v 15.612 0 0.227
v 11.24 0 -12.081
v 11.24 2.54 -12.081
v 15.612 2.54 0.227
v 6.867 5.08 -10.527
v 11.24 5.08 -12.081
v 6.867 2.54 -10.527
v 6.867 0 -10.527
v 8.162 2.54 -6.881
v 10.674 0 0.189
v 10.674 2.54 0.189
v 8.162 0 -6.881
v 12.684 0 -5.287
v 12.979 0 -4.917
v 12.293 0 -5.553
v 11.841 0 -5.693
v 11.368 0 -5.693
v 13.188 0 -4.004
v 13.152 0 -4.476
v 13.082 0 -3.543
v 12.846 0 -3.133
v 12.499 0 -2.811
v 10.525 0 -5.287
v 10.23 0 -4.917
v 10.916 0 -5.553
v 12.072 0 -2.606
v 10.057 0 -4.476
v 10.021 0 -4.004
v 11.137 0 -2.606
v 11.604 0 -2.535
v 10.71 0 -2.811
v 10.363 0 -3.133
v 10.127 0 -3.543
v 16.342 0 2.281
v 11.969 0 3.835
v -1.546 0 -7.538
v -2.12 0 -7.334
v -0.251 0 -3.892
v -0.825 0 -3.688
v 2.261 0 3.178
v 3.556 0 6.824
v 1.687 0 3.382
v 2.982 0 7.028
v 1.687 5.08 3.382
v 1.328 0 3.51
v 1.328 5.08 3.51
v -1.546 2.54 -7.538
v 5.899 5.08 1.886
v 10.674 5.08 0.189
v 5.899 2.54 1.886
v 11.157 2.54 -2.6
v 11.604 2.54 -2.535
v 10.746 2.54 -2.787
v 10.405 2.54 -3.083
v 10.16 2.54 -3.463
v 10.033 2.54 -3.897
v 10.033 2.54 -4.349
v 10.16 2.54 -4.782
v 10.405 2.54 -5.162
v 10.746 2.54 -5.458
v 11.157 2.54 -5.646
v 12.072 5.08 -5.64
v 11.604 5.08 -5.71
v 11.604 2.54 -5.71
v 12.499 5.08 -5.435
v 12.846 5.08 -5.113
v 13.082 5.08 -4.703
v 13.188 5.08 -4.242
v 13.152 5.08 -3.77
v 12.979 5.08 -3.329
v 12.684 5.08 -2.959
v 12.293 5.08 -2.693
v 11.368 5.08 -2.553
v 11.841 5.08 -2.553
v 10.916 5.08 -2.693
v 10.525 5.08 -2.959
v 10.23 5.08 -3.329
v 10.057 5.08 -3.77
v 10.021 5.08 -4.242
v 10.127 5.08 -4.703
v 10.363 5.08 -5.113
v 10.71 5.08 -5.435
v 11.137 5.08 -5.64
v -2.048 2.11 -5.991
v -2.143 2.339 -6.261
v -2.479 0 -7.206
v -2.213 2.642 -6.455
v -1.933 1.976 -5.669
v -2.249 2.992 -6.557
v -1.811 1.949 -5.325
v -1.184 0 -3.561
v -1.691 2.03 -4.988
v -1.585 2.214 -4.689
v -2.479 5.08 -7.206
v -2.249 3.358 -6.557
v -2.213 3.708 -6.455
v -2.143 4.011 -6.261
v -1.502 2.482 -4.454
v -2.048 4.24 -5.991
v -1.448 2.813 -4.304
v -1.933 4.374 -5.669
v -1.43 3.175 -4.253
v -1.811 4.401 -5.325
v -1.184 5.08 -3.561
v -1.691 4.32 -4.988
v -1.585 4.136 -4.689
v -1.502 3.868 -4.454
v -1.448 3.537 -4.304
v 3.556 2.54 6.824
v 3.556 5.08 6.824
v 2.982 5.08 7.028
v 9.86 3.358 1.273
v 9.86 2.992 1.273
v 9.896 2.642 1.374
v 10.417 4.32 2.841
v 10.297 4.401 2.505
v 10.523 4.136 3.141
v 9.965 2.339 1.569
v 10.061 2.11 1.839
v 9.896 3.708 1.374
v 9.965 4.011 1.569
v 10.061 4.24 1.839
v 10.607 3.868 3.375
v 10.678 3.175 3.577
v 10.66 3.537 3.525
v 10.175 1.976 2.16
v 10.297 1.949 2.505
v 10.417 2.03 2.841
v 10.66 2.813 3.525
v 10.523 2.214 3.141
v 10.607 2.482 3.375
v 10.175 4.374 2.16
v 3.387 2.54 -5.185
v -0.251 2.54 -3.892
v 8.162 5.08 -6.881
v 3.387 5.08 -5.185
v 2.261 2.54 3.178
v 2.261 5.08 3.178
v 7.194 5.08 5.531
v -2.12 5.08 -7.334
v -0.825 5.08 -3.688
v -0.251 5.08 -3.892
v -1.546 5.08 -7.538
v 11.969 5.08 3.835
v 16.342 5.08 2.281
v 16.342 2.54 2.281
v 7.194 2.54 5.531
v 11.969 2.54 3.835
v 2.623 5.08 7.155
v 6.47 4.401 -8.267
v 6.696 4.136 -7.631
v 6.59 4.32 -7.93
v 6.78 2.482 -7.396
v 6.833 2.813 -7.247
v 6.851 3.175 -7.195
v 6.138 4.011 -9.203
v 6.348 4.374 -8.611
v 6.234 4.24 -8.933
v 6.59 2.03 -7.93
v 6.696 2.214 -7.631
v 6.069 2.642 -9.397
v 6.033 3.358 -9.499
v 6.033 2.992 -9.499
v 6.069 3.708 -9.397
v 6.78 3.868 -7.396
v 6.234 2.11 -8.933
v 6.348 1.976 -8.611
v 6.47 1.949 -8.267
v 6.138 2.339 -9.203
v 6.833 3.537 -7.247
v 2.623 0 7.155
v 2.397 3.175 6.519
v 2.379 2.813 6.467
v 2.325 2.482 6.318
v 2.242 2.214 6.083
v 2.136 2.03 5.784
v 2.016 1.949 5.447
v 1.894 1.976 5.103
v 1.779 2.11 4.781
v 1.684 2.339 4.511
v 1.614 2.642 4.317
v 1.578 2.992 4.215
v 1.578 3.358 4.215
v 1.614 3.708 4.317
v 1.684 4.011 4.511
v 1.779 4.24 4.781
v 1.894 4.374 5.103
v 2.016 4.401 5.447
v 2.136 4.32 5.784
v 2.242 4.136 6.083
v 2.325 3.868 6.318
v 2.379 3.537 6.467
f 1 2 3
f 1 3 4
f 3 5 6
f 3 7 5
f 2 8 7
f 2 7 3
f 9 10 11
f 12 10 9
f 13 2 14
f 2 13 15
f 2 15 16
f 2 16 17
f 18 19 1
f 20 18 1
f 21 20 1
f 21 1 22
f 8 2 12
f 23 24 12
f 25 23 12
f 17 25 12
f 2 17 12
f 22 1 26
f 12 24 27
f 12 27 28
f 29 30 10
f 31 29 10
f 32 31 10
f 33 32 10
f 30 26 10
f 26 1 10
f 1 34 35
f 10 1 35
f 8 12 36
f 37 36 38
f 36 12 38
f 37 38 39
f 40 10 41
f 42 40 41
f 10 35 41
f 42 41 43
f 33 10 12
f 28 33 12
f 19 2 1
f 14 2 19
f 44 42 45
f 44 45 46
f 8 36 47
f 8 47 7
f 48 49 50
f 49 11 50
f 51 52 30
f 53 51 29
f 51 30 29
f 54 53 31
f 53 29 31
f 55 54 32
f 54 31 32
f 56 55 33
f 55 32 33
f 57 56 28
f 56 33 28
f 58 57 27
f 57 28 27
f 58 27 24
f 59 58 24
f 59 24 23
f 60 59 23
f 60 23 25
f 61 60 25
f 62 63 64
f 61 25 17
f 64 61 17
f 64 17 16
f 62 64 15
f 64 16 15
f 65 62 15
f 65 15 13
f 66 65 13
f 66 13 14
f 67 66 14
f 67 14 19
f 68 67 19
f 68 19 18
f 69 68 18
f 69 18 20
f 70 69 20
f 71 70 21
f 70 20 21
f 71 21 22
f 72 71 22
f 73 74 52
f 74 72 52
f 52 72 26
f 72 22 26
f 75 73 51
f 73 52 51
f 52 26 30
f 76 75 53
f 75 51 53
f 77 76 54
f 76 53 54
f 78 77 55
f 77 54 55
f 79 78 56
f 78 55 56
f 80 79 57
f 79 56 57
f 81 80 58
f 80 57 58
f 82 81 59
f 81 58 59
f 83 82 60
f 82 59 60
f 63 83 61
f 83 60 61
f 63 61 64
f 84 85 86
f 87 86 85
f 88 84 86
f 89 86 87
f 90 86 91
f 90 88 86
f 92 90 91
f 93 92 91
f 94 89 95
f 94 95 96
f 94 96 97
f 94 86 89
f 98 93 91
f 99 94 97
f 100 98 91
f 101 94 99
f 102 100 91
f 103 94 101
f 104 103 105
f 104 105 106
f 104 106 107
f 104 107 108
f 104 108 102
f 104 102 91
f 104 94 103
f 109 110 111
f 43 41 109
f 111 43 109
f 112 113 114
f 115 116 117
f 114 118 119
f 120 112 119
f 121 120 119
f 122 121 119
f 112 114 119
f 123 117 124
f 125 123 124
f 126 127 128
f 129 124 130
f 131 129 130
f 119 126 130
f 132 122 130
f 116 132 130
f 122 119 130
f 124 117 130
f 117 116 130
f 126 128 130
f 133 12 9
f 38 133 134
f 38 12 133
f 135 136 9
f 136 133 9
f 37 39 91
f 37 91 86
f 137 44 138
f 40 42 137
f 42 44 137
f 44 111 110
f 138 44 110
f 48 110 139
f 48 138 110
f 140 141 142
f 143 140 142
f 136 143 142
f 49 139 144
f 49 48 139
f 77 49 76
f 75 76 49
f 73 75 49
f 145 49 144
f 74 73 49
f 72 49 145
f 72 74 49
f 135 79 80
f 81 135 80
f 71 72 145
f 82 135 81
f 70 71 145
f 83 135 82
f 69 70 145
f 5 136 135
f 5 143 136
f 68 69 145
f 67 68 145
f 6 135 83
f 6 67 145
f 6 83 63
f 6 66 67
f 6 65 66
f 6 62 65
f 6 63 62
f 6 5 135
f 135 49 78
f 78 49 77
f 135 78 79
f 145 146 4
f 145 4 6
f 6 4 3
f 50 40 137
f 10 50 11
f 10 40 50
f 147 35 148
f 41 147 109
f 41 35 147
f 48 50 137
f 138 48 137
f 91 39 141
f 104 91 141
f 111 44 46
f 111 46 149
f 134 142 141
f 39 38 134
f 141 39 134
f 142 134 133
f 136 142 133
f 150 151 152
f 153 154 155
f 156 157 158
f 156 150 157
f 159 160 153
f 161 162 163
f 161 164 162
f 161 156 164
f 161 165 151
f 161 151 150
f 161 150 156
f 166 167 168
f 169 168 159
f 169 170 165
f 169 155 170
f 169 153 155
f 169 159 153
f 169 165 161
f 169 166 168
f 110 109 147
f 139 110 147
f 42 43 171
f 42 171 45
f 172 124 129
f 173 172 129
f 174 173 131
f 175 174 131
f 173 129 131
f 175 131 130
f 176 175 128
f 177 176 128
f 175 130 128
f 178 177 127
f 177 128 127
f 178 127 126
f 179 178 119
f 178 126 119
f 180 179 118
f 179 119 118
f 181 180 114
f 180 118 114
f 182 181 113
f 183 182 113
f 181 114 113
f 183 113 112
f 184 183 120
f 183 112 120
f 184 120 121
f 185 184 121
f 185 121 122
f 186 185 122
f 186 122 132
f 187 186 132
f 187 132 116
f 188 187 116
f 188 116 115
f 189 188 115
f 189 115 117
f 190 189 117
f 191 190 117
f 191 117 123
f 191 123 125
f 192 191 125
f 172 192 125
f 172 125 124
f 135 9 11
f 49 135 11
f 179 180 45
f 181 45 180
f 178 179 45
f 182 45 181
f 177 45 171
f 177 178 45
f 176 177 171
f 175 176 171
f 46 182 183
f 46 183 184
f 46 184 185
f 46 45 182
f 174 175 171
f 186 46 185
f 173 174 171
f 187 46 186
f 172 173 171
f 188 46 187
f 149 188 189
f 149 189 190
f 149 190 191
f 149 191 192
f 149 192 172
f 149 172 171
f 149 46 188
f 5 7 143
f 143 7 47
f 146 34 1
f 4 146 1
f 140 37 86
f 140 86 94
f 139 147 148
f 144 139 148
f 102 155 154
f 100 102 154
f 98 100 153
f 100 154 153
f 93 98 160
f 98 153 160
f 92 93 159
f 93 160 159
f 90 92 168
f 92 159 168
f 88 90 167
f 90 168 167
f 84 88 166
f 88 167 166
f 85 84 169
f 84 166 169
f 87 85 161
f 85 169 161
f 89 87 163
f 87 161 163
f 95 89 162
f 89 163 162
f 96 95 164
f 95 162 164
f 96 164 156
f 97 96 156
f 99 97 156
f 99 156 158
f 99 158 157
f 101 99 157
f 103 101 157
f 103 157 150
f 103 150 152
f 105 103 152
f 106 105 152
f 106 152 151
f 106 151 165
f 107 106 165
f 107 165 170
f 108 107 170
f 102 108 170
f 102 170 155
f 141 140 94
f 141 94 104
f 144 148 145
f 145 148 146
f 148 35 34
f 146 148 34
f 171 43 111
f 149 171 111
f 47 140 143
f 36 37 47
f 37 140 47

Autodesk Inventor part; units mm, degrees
ref_plane "YZ Plane" through (0, 0, 0) normal (1, 0, 0) x (0, 1, 0)
ref_plane "XZ Plane" through (0, 0, 0) normal (0, 1, 0) x (-1, 0, 0)
ref_plane "XY Plane" through (0, 0, 0) normal (0, 0, 1) x (1, 0, 0)
sketch "Sketch1" plane through (0, 0, 0) normal (0, 1, 0) x (-1, 0, 0)
  line L0 (6.5094, 9.5985) -> (7.4635, 6.913)
  line L1 (10.1521, -0.6544) -> (11.1062, -3.34)
  line L2 (-11.9694, 3.8348) -> (7.7922, 10.8558)
  line L3 (9.0875, 7.21) -> (-10.6741, 0.1891)
  line L4 (-8.1622, -6.8813) -> (11.5995, 0.1397)
  line L5 (12.8948, -3.5061) -> (-6.8669, -10.5271)
  line L6 (-6.8669, -10.5271) -> (-8.1622, -6.8813)
  line L7 (11.5995, 0.1397) -> (12.8948, -3.5061)
  line L8 (7.7922, 10.8558) -> (9.0875, 7.21)
  line L9 (-10.6741, 0.1891) -> (-11.9694, 3.8348)
  line L10 (6.9865, 8.2558) -> (-11.2395, 1.7804)
  line L11 (10.6292, -1.9972) -> (-7.5968, -8.4726)
  circle A0 centre (-12.8288, -4.5578) radius 1.5875
  line L12 (-12.8288, -4.5578) -> (-11.2395, 1.7804)
  line L13 (-7.5968, -8.4726) -> (-12.8288, -4.5578)
  line L14 (-11.2395, 1.7804) -> (-7.5968, -8.4726)
  line L15 (-6.8669, -10.5271) -> (-11.2395, -12.0806)
  line L16 (-11.2395, -12.0806) -> (-15.6121, 0.2269)
  line L17 (-15.6121, 0.2269) -> (-11.2395, 1.7804)
  line L18 (6.5094, 9.5985) -> (-11.7166, 3.1231)
  line L19 (7.4635, 6.913) -> (-10.7624, 0.4376)
  line L20 (10.1521, -0.6544) -> (-8.0739, -7.1298)
  line L21 (11.1062, -3.34) -> (-7.1197, -9.8154)
  line L22 (11.645, -4.8563) -> (9.3537, 1.5929)
  line L23 (-11.9694, 3.8348) -> (-16.342, 2.2813)
  line L24 (-16.342, 2.2813) -> (-15.6121, 0.2269)
  line L25 (-11.9694, 3.8348) -> (-11.2395, 1.7804)
  line L26 (6.9865, 8.2558) -> (-2.8266, 4.7693)
  line L27 (10.6292, -1.9972) -> (0.8161, -5.4836)
  line L28 (0.8161, -5.4836) -> (1.2932, -6.8264)
  line L29 (0.339, -4.1409) -> (0.8161, -5.4836)
  line L30 (-2.8266, 4.7693) -> (-2.3495, 3.4266)
  line L31 (-2.8266, 4.7693) -> (-3.3037, 6.1121)
  line L32 (-11.9694, 3.8348) -> (-3.5565, 6.8238)
  line L33 (-2.2612, 3.178) -> (-2.3495, 3.4266)
  line L34 (-2.2612, 3.178) -> (-10.6741, 0.1891)
  line L35 (0.339, -4.1409) -> (0.2507, -3.8923)
  line L36 (-8.1622, -6.8813) -> (0.2507, -3.8923)
  line L37 (1.2932, -6.8264) -> (1.546, -7.5381)
  line L38 (-6.8669, -10.5271) -> (1.546, -7.5381)
  line L39 (-6.8669, -10.5271) -> (-7.5968, -8.4726)
  line L40 (-3.3037, 6.1121) -> (-3.5565, 6.8238)
  point P0 (0, 0)
  dimension "d0" = 10.414
  dimension "d1" = 10.414
extrude "Extrusion1" add sketch "Sketch1" along normal blind 2.54 contours L31 L10 L9 L18 | L18 L9 L2 L40 | L30 L19 L9 L10 | L9 L17 L24 L23 | L33 L3 L9 L19 | L9 L14 L6 L13 A0 L12 | L12 A0 L16 L17 | L12 L13 A0 L16 | A0 L13 L12 | L4 L35 L20 L6 | L13 L6 L15 L16 A0 | L20 L29 L11 L6 | L11 L28 L21 L6 | L21 L37 L5 L6
sketch "Sketch2" plane through (0, 2.54, 0) normal (0, 1, 0) x (1, 0, 0)
  line L0 (11.2395, 12.0806) -> (-1.546, 7.5381) projected
  line L1 (-1.546, 7.5381) -> (2.092, 8.8306)
  line L2 (2.092, 8.8306) -> (3.3873, 5.1848)
  line L3 (-0.2507, 3.8923) -> (8.1622, 6.8813) projected
  line L4 (-0.2507, 3.8923) -> (3.3873, 5.1848)
  line L5 (-1.546, 7.5381) -> (-0.2507, 3.8923) projected
  line L6 (-0.2507, 3.8923) -> (-1.546, 7.5381)
  line L7 (2.2612, -3.178) -> (3.5565, -6.8238) projected
  line L8 (2.2612, -3.178) -> (3.5565, -6.8238)
  line L9 (3.5565, -6.8238) -> (7.1945, -5.5313)
  line L10 (3.5565, -6.8238) -> (16.342, -2.2813) projected
  line L11 (7.1945, -5.5313) -> (5.8992, -1.8855)
  line L12 (10.6741, -0.1891) -> (2.2612, -3.178) projected
  line L13 (2.2612, -3.178) -> (5.8992, -1.8855)
  point P0 (0, 0)
  dimension "d4" = 3.8608
  dimension "d5" = 3.8608
extrude "Extrusion2" add sketch "Sketch2" along normal blind 2.54
sketch "Sketch3" plane through (0, 2.54, 0) normal (0, 1, 0) x (1, 0, 0)
  line L0 (8.1622, 6.8813) -> (10.6741, -0.1891) projected
  line L1 (8.1622, 6.8813) -> (6.8669, 10.5271)
  line L2 (11.2395, 12.0806) -> (-1.546, 7.5381) projected
  line L3 (10.6615, -0.1534) -> (11.9694, -3.8348)
  line L4 (7.1945, -5.5313) -> (16.342, -2.2813) projected
  line L5 (6.8669, 10.5271) -> (2.092, 8.8306)
  line L6 (3.3873, 5.1848) -> (8.1622, 6.8813) projected
  line L7 (3.3873, 5.1848) -> (8.1622, 6.8813)
  line L8 (8.1622, 6.8813) -> (3.3873, 5.1848)
  line L9 (3.3873, 5.1848) -> (2.092, 8.8306) projected
  line L10 (2.092, 8.8306) -> (3.3873, 5.1848)
  line L11 (10.6741, -0.1891) -> (5.8992, -1.8855) projected
  line L12 (5.8992, -1.8855) -> (10.6741, -0.1891)
  line L13 (10.6741, -0.1891) -> (11.9694, -3.8348)
  line L14 (5.8992, -1.8855) -> (7.1945, -5.5313) projected
  line L15 (11.9694, -3.8348) -> (7.1945, -5.5313)
  line L16 (7.1945, -5.5313) -> (5.8992, -1.8855)
  point P0 (0, 0)
extrude "Extrusion3" add sketch "Sketch3" along normal blind 2.54
sketch "Sketch6" plane through (0, 2.54, 0) normal (0, 1, 0) x (1, 0, 0)
  line L0 (8.1622, 6.8813) -> (10.6741, -0.1891) projected
  line L1 (8.1622, 6.8813) -> (12.5348, 8.4348)
  line L2 (16.342, -2.2813) -> (11.2395, 12.0806) projected
  line L3 (10.6741, -0.1891) -> (15.0468, 1.3644)
  line L4 (15.0468, 1.3644) -> (12.8604, 0.5877)
  line L5 (10.3485, 7.658) -> (12.8604, 0.5877)
  line L6 (10.3485, 7.658) -> (9.0532, 11.3038)
  line L7 (11.2395, 12.0806) -> (-1.546, 7.5381) projected
  line L8 (12.8604, 0.5877) -> (14.1557, -3.0581)
  line L9 (11.9694, -3.8348) -> (16.342, -2.2813) projected
  circle A0 centre (11.6045, 4.1229) radius 1.4859
  point P0 (0, 0)
  dimension "d28" = 2.9718
hole "Hole3" at (11.6045, 2.54, -4.1229) direction (0, -1, 0) diameter 3.175 depth 7.62
sketch "Sketch7" plane through (0, 2.54, 0) normal (0, 1, 0) x (1, 0, 0)
  circle A0 centre (11.6045, 4.1229) radius 1.5875 projected
  line L0 (10.6741, -0.1891) -> (11.9694, -3.8348) projected
  line L1 (11.9694, -3.8348) -> (16.342, -2.2813) projected
  line L2 (16.342, -2.2813) -> (11.2395, 12.0806) projected
  line L3 (11.2395, 12.0806) -> (6.8669, 10.5271) projected
  line L4 (6.8669, 10.5271) -> (8.1622, 6.8813) projected
  line L5 (8.1622, 6.8813) -> (10.6741, -0.1891) projected
  point P0 (0, 0)
extrude "Extrusion4" add sketch "Sketch7" along normal blind 2.54 contours A0 | L5 L4 L3 L2 L1 L0
sketch "Sketch8" plane through (11.6045, 2.54, -4.1229) normal (0, -1, 0) x (1, 0, 0)
  circle A0 centre (0, 0) radius 1.5875 projected
  point P0 (-11.6045, 4.1229)
hole "Hole4" at (11.6045, 2.54, -4.1229) direction (0, 1, 0) diameter 3.175 depth 7.62
sketch "Sketch9" plane through (0, 0, 0) normal (0, -1, 0) x (1, 0, 0)
  line L0 (3.5565, 6.8238) -> (16.342, 2.2813) projected
  line L1 (10.6741, 0.1891) -> (2.2612, 3.178) projected
  line L2 (-0.2507, -3.8923) -> (8.1622, -6.8813) projected
  line L3 (11.2395, -12.0806) -> (-1.546, -7.5381) projected
  line L4 (3.5565, 6.8238) -> (16.342, 2.2813) projected
  line L5 (3.5565, 6.8238) -> (2.9821, 7.0279)
  line L6 (10.5107, 3.6362) -> (3.3304, 6.1873) projected
  line L7 (2.9821, 7.0279) -> (1.6868, 3.3821)
  line L8 (2.2612, 3.178) -> (3.5565, 6.8238) projected
  line L9 (1.6868, 3.3821) -> (2.2612, 3.178)
  line L10 (-1.546, -7.5381) -> (-0.2507, -3.8923) projected
  line L11 (-0.2507, -3.8923) -> (-0.8252, -3.6882)
  line L12 (-0.8252, -3.6882) -> (-2.1204, -7.334)
  line L13 (-2.1204, -7.334) -> (-1.4728, -7.5641)
  point P0 (0, 0)
  dimension "d45" = 0.6096
extrude "Extrusion5" add sketch "Sketch9" against normal blind 5.08
sketch "Sketch12" plane through (2.9821, 0, 7.0279) normal (-0.9422958, 0, 0.3347815) x (0.3347815, 0, 0.9422958)
  line L0 (0, 0) -> (-3.869, 0) projected
  line L1 (0, 0) -> (0, 5.08) projected
  line L2 (-3.869, 5.08) -> (0, 5.08) projected
  line L3 (-3.869, 0) -> (-3.869, 5.08) projected
  line L4 (-11.3724, 0) -> (-15.2414, 0) projected
  line L5 (-11.3724, 0) -> (-11.3724, 5.08) projected
  line L6 (-15.2414, 5.08) -> (-11.3724, 5.08) projected
  line L7 (-15.2414, 0) -> (-15.2414, 5.08) projected
  point P0 (-7.6207, 0)
extrude "Extrusion6" add sketch "Sketch12" along normal blind 0.381
sketch "Sketch15" plane through (2.6231, 0, 7.1554) normal (-0.9422958, 0, 0.3347815) x (0.3347815, 0, 0.9422958)
  line L0 (-11.3724, 5.08) -> (-15.2414, 5.08) projected
  line L1 (-15.2414, 5.08) -> (-15.2414, 0) projected
  point P0 (-7.6207, 0)
  point P1 (-13.3364, 3.175)
  dimension "d93" = 1.905
  dimension "d94" = 1.905
hole "Hole10" at (-1.8417, 3.175, -5.4114) direction (0.9422958, 0, -0.3347815) diameter 2.459 depth 8.7884 thread size "M3x0.5" class "6H" standard "ISO Metric profile"
sketch "Sketch16" plane through (2.6231, 0, 7.1554) normal (-0.9422958, 0, 0.3347815) x (0.3347815, 0, 0.9422958)
  line L0 (0, 5.08) -> (-3.869, 5.08) projected
  line L1 (0, 0) -> (0, 5.08) projected
  point P0 (-7.6207, 0)
  point P1 (-1.905, 3.175)
  dimension "d102" = 1.905
  dimension "d103" = 1.905
hole "Hole11" at (1.9853, 3.175, 5.3604) direction (0.9422958, 0, -0.3347815) diameter 2.459 depth 8.7884 thread size "M3x0.5" class "6H" standard "ISO Metric profile"
properties part number "fileholddub"
